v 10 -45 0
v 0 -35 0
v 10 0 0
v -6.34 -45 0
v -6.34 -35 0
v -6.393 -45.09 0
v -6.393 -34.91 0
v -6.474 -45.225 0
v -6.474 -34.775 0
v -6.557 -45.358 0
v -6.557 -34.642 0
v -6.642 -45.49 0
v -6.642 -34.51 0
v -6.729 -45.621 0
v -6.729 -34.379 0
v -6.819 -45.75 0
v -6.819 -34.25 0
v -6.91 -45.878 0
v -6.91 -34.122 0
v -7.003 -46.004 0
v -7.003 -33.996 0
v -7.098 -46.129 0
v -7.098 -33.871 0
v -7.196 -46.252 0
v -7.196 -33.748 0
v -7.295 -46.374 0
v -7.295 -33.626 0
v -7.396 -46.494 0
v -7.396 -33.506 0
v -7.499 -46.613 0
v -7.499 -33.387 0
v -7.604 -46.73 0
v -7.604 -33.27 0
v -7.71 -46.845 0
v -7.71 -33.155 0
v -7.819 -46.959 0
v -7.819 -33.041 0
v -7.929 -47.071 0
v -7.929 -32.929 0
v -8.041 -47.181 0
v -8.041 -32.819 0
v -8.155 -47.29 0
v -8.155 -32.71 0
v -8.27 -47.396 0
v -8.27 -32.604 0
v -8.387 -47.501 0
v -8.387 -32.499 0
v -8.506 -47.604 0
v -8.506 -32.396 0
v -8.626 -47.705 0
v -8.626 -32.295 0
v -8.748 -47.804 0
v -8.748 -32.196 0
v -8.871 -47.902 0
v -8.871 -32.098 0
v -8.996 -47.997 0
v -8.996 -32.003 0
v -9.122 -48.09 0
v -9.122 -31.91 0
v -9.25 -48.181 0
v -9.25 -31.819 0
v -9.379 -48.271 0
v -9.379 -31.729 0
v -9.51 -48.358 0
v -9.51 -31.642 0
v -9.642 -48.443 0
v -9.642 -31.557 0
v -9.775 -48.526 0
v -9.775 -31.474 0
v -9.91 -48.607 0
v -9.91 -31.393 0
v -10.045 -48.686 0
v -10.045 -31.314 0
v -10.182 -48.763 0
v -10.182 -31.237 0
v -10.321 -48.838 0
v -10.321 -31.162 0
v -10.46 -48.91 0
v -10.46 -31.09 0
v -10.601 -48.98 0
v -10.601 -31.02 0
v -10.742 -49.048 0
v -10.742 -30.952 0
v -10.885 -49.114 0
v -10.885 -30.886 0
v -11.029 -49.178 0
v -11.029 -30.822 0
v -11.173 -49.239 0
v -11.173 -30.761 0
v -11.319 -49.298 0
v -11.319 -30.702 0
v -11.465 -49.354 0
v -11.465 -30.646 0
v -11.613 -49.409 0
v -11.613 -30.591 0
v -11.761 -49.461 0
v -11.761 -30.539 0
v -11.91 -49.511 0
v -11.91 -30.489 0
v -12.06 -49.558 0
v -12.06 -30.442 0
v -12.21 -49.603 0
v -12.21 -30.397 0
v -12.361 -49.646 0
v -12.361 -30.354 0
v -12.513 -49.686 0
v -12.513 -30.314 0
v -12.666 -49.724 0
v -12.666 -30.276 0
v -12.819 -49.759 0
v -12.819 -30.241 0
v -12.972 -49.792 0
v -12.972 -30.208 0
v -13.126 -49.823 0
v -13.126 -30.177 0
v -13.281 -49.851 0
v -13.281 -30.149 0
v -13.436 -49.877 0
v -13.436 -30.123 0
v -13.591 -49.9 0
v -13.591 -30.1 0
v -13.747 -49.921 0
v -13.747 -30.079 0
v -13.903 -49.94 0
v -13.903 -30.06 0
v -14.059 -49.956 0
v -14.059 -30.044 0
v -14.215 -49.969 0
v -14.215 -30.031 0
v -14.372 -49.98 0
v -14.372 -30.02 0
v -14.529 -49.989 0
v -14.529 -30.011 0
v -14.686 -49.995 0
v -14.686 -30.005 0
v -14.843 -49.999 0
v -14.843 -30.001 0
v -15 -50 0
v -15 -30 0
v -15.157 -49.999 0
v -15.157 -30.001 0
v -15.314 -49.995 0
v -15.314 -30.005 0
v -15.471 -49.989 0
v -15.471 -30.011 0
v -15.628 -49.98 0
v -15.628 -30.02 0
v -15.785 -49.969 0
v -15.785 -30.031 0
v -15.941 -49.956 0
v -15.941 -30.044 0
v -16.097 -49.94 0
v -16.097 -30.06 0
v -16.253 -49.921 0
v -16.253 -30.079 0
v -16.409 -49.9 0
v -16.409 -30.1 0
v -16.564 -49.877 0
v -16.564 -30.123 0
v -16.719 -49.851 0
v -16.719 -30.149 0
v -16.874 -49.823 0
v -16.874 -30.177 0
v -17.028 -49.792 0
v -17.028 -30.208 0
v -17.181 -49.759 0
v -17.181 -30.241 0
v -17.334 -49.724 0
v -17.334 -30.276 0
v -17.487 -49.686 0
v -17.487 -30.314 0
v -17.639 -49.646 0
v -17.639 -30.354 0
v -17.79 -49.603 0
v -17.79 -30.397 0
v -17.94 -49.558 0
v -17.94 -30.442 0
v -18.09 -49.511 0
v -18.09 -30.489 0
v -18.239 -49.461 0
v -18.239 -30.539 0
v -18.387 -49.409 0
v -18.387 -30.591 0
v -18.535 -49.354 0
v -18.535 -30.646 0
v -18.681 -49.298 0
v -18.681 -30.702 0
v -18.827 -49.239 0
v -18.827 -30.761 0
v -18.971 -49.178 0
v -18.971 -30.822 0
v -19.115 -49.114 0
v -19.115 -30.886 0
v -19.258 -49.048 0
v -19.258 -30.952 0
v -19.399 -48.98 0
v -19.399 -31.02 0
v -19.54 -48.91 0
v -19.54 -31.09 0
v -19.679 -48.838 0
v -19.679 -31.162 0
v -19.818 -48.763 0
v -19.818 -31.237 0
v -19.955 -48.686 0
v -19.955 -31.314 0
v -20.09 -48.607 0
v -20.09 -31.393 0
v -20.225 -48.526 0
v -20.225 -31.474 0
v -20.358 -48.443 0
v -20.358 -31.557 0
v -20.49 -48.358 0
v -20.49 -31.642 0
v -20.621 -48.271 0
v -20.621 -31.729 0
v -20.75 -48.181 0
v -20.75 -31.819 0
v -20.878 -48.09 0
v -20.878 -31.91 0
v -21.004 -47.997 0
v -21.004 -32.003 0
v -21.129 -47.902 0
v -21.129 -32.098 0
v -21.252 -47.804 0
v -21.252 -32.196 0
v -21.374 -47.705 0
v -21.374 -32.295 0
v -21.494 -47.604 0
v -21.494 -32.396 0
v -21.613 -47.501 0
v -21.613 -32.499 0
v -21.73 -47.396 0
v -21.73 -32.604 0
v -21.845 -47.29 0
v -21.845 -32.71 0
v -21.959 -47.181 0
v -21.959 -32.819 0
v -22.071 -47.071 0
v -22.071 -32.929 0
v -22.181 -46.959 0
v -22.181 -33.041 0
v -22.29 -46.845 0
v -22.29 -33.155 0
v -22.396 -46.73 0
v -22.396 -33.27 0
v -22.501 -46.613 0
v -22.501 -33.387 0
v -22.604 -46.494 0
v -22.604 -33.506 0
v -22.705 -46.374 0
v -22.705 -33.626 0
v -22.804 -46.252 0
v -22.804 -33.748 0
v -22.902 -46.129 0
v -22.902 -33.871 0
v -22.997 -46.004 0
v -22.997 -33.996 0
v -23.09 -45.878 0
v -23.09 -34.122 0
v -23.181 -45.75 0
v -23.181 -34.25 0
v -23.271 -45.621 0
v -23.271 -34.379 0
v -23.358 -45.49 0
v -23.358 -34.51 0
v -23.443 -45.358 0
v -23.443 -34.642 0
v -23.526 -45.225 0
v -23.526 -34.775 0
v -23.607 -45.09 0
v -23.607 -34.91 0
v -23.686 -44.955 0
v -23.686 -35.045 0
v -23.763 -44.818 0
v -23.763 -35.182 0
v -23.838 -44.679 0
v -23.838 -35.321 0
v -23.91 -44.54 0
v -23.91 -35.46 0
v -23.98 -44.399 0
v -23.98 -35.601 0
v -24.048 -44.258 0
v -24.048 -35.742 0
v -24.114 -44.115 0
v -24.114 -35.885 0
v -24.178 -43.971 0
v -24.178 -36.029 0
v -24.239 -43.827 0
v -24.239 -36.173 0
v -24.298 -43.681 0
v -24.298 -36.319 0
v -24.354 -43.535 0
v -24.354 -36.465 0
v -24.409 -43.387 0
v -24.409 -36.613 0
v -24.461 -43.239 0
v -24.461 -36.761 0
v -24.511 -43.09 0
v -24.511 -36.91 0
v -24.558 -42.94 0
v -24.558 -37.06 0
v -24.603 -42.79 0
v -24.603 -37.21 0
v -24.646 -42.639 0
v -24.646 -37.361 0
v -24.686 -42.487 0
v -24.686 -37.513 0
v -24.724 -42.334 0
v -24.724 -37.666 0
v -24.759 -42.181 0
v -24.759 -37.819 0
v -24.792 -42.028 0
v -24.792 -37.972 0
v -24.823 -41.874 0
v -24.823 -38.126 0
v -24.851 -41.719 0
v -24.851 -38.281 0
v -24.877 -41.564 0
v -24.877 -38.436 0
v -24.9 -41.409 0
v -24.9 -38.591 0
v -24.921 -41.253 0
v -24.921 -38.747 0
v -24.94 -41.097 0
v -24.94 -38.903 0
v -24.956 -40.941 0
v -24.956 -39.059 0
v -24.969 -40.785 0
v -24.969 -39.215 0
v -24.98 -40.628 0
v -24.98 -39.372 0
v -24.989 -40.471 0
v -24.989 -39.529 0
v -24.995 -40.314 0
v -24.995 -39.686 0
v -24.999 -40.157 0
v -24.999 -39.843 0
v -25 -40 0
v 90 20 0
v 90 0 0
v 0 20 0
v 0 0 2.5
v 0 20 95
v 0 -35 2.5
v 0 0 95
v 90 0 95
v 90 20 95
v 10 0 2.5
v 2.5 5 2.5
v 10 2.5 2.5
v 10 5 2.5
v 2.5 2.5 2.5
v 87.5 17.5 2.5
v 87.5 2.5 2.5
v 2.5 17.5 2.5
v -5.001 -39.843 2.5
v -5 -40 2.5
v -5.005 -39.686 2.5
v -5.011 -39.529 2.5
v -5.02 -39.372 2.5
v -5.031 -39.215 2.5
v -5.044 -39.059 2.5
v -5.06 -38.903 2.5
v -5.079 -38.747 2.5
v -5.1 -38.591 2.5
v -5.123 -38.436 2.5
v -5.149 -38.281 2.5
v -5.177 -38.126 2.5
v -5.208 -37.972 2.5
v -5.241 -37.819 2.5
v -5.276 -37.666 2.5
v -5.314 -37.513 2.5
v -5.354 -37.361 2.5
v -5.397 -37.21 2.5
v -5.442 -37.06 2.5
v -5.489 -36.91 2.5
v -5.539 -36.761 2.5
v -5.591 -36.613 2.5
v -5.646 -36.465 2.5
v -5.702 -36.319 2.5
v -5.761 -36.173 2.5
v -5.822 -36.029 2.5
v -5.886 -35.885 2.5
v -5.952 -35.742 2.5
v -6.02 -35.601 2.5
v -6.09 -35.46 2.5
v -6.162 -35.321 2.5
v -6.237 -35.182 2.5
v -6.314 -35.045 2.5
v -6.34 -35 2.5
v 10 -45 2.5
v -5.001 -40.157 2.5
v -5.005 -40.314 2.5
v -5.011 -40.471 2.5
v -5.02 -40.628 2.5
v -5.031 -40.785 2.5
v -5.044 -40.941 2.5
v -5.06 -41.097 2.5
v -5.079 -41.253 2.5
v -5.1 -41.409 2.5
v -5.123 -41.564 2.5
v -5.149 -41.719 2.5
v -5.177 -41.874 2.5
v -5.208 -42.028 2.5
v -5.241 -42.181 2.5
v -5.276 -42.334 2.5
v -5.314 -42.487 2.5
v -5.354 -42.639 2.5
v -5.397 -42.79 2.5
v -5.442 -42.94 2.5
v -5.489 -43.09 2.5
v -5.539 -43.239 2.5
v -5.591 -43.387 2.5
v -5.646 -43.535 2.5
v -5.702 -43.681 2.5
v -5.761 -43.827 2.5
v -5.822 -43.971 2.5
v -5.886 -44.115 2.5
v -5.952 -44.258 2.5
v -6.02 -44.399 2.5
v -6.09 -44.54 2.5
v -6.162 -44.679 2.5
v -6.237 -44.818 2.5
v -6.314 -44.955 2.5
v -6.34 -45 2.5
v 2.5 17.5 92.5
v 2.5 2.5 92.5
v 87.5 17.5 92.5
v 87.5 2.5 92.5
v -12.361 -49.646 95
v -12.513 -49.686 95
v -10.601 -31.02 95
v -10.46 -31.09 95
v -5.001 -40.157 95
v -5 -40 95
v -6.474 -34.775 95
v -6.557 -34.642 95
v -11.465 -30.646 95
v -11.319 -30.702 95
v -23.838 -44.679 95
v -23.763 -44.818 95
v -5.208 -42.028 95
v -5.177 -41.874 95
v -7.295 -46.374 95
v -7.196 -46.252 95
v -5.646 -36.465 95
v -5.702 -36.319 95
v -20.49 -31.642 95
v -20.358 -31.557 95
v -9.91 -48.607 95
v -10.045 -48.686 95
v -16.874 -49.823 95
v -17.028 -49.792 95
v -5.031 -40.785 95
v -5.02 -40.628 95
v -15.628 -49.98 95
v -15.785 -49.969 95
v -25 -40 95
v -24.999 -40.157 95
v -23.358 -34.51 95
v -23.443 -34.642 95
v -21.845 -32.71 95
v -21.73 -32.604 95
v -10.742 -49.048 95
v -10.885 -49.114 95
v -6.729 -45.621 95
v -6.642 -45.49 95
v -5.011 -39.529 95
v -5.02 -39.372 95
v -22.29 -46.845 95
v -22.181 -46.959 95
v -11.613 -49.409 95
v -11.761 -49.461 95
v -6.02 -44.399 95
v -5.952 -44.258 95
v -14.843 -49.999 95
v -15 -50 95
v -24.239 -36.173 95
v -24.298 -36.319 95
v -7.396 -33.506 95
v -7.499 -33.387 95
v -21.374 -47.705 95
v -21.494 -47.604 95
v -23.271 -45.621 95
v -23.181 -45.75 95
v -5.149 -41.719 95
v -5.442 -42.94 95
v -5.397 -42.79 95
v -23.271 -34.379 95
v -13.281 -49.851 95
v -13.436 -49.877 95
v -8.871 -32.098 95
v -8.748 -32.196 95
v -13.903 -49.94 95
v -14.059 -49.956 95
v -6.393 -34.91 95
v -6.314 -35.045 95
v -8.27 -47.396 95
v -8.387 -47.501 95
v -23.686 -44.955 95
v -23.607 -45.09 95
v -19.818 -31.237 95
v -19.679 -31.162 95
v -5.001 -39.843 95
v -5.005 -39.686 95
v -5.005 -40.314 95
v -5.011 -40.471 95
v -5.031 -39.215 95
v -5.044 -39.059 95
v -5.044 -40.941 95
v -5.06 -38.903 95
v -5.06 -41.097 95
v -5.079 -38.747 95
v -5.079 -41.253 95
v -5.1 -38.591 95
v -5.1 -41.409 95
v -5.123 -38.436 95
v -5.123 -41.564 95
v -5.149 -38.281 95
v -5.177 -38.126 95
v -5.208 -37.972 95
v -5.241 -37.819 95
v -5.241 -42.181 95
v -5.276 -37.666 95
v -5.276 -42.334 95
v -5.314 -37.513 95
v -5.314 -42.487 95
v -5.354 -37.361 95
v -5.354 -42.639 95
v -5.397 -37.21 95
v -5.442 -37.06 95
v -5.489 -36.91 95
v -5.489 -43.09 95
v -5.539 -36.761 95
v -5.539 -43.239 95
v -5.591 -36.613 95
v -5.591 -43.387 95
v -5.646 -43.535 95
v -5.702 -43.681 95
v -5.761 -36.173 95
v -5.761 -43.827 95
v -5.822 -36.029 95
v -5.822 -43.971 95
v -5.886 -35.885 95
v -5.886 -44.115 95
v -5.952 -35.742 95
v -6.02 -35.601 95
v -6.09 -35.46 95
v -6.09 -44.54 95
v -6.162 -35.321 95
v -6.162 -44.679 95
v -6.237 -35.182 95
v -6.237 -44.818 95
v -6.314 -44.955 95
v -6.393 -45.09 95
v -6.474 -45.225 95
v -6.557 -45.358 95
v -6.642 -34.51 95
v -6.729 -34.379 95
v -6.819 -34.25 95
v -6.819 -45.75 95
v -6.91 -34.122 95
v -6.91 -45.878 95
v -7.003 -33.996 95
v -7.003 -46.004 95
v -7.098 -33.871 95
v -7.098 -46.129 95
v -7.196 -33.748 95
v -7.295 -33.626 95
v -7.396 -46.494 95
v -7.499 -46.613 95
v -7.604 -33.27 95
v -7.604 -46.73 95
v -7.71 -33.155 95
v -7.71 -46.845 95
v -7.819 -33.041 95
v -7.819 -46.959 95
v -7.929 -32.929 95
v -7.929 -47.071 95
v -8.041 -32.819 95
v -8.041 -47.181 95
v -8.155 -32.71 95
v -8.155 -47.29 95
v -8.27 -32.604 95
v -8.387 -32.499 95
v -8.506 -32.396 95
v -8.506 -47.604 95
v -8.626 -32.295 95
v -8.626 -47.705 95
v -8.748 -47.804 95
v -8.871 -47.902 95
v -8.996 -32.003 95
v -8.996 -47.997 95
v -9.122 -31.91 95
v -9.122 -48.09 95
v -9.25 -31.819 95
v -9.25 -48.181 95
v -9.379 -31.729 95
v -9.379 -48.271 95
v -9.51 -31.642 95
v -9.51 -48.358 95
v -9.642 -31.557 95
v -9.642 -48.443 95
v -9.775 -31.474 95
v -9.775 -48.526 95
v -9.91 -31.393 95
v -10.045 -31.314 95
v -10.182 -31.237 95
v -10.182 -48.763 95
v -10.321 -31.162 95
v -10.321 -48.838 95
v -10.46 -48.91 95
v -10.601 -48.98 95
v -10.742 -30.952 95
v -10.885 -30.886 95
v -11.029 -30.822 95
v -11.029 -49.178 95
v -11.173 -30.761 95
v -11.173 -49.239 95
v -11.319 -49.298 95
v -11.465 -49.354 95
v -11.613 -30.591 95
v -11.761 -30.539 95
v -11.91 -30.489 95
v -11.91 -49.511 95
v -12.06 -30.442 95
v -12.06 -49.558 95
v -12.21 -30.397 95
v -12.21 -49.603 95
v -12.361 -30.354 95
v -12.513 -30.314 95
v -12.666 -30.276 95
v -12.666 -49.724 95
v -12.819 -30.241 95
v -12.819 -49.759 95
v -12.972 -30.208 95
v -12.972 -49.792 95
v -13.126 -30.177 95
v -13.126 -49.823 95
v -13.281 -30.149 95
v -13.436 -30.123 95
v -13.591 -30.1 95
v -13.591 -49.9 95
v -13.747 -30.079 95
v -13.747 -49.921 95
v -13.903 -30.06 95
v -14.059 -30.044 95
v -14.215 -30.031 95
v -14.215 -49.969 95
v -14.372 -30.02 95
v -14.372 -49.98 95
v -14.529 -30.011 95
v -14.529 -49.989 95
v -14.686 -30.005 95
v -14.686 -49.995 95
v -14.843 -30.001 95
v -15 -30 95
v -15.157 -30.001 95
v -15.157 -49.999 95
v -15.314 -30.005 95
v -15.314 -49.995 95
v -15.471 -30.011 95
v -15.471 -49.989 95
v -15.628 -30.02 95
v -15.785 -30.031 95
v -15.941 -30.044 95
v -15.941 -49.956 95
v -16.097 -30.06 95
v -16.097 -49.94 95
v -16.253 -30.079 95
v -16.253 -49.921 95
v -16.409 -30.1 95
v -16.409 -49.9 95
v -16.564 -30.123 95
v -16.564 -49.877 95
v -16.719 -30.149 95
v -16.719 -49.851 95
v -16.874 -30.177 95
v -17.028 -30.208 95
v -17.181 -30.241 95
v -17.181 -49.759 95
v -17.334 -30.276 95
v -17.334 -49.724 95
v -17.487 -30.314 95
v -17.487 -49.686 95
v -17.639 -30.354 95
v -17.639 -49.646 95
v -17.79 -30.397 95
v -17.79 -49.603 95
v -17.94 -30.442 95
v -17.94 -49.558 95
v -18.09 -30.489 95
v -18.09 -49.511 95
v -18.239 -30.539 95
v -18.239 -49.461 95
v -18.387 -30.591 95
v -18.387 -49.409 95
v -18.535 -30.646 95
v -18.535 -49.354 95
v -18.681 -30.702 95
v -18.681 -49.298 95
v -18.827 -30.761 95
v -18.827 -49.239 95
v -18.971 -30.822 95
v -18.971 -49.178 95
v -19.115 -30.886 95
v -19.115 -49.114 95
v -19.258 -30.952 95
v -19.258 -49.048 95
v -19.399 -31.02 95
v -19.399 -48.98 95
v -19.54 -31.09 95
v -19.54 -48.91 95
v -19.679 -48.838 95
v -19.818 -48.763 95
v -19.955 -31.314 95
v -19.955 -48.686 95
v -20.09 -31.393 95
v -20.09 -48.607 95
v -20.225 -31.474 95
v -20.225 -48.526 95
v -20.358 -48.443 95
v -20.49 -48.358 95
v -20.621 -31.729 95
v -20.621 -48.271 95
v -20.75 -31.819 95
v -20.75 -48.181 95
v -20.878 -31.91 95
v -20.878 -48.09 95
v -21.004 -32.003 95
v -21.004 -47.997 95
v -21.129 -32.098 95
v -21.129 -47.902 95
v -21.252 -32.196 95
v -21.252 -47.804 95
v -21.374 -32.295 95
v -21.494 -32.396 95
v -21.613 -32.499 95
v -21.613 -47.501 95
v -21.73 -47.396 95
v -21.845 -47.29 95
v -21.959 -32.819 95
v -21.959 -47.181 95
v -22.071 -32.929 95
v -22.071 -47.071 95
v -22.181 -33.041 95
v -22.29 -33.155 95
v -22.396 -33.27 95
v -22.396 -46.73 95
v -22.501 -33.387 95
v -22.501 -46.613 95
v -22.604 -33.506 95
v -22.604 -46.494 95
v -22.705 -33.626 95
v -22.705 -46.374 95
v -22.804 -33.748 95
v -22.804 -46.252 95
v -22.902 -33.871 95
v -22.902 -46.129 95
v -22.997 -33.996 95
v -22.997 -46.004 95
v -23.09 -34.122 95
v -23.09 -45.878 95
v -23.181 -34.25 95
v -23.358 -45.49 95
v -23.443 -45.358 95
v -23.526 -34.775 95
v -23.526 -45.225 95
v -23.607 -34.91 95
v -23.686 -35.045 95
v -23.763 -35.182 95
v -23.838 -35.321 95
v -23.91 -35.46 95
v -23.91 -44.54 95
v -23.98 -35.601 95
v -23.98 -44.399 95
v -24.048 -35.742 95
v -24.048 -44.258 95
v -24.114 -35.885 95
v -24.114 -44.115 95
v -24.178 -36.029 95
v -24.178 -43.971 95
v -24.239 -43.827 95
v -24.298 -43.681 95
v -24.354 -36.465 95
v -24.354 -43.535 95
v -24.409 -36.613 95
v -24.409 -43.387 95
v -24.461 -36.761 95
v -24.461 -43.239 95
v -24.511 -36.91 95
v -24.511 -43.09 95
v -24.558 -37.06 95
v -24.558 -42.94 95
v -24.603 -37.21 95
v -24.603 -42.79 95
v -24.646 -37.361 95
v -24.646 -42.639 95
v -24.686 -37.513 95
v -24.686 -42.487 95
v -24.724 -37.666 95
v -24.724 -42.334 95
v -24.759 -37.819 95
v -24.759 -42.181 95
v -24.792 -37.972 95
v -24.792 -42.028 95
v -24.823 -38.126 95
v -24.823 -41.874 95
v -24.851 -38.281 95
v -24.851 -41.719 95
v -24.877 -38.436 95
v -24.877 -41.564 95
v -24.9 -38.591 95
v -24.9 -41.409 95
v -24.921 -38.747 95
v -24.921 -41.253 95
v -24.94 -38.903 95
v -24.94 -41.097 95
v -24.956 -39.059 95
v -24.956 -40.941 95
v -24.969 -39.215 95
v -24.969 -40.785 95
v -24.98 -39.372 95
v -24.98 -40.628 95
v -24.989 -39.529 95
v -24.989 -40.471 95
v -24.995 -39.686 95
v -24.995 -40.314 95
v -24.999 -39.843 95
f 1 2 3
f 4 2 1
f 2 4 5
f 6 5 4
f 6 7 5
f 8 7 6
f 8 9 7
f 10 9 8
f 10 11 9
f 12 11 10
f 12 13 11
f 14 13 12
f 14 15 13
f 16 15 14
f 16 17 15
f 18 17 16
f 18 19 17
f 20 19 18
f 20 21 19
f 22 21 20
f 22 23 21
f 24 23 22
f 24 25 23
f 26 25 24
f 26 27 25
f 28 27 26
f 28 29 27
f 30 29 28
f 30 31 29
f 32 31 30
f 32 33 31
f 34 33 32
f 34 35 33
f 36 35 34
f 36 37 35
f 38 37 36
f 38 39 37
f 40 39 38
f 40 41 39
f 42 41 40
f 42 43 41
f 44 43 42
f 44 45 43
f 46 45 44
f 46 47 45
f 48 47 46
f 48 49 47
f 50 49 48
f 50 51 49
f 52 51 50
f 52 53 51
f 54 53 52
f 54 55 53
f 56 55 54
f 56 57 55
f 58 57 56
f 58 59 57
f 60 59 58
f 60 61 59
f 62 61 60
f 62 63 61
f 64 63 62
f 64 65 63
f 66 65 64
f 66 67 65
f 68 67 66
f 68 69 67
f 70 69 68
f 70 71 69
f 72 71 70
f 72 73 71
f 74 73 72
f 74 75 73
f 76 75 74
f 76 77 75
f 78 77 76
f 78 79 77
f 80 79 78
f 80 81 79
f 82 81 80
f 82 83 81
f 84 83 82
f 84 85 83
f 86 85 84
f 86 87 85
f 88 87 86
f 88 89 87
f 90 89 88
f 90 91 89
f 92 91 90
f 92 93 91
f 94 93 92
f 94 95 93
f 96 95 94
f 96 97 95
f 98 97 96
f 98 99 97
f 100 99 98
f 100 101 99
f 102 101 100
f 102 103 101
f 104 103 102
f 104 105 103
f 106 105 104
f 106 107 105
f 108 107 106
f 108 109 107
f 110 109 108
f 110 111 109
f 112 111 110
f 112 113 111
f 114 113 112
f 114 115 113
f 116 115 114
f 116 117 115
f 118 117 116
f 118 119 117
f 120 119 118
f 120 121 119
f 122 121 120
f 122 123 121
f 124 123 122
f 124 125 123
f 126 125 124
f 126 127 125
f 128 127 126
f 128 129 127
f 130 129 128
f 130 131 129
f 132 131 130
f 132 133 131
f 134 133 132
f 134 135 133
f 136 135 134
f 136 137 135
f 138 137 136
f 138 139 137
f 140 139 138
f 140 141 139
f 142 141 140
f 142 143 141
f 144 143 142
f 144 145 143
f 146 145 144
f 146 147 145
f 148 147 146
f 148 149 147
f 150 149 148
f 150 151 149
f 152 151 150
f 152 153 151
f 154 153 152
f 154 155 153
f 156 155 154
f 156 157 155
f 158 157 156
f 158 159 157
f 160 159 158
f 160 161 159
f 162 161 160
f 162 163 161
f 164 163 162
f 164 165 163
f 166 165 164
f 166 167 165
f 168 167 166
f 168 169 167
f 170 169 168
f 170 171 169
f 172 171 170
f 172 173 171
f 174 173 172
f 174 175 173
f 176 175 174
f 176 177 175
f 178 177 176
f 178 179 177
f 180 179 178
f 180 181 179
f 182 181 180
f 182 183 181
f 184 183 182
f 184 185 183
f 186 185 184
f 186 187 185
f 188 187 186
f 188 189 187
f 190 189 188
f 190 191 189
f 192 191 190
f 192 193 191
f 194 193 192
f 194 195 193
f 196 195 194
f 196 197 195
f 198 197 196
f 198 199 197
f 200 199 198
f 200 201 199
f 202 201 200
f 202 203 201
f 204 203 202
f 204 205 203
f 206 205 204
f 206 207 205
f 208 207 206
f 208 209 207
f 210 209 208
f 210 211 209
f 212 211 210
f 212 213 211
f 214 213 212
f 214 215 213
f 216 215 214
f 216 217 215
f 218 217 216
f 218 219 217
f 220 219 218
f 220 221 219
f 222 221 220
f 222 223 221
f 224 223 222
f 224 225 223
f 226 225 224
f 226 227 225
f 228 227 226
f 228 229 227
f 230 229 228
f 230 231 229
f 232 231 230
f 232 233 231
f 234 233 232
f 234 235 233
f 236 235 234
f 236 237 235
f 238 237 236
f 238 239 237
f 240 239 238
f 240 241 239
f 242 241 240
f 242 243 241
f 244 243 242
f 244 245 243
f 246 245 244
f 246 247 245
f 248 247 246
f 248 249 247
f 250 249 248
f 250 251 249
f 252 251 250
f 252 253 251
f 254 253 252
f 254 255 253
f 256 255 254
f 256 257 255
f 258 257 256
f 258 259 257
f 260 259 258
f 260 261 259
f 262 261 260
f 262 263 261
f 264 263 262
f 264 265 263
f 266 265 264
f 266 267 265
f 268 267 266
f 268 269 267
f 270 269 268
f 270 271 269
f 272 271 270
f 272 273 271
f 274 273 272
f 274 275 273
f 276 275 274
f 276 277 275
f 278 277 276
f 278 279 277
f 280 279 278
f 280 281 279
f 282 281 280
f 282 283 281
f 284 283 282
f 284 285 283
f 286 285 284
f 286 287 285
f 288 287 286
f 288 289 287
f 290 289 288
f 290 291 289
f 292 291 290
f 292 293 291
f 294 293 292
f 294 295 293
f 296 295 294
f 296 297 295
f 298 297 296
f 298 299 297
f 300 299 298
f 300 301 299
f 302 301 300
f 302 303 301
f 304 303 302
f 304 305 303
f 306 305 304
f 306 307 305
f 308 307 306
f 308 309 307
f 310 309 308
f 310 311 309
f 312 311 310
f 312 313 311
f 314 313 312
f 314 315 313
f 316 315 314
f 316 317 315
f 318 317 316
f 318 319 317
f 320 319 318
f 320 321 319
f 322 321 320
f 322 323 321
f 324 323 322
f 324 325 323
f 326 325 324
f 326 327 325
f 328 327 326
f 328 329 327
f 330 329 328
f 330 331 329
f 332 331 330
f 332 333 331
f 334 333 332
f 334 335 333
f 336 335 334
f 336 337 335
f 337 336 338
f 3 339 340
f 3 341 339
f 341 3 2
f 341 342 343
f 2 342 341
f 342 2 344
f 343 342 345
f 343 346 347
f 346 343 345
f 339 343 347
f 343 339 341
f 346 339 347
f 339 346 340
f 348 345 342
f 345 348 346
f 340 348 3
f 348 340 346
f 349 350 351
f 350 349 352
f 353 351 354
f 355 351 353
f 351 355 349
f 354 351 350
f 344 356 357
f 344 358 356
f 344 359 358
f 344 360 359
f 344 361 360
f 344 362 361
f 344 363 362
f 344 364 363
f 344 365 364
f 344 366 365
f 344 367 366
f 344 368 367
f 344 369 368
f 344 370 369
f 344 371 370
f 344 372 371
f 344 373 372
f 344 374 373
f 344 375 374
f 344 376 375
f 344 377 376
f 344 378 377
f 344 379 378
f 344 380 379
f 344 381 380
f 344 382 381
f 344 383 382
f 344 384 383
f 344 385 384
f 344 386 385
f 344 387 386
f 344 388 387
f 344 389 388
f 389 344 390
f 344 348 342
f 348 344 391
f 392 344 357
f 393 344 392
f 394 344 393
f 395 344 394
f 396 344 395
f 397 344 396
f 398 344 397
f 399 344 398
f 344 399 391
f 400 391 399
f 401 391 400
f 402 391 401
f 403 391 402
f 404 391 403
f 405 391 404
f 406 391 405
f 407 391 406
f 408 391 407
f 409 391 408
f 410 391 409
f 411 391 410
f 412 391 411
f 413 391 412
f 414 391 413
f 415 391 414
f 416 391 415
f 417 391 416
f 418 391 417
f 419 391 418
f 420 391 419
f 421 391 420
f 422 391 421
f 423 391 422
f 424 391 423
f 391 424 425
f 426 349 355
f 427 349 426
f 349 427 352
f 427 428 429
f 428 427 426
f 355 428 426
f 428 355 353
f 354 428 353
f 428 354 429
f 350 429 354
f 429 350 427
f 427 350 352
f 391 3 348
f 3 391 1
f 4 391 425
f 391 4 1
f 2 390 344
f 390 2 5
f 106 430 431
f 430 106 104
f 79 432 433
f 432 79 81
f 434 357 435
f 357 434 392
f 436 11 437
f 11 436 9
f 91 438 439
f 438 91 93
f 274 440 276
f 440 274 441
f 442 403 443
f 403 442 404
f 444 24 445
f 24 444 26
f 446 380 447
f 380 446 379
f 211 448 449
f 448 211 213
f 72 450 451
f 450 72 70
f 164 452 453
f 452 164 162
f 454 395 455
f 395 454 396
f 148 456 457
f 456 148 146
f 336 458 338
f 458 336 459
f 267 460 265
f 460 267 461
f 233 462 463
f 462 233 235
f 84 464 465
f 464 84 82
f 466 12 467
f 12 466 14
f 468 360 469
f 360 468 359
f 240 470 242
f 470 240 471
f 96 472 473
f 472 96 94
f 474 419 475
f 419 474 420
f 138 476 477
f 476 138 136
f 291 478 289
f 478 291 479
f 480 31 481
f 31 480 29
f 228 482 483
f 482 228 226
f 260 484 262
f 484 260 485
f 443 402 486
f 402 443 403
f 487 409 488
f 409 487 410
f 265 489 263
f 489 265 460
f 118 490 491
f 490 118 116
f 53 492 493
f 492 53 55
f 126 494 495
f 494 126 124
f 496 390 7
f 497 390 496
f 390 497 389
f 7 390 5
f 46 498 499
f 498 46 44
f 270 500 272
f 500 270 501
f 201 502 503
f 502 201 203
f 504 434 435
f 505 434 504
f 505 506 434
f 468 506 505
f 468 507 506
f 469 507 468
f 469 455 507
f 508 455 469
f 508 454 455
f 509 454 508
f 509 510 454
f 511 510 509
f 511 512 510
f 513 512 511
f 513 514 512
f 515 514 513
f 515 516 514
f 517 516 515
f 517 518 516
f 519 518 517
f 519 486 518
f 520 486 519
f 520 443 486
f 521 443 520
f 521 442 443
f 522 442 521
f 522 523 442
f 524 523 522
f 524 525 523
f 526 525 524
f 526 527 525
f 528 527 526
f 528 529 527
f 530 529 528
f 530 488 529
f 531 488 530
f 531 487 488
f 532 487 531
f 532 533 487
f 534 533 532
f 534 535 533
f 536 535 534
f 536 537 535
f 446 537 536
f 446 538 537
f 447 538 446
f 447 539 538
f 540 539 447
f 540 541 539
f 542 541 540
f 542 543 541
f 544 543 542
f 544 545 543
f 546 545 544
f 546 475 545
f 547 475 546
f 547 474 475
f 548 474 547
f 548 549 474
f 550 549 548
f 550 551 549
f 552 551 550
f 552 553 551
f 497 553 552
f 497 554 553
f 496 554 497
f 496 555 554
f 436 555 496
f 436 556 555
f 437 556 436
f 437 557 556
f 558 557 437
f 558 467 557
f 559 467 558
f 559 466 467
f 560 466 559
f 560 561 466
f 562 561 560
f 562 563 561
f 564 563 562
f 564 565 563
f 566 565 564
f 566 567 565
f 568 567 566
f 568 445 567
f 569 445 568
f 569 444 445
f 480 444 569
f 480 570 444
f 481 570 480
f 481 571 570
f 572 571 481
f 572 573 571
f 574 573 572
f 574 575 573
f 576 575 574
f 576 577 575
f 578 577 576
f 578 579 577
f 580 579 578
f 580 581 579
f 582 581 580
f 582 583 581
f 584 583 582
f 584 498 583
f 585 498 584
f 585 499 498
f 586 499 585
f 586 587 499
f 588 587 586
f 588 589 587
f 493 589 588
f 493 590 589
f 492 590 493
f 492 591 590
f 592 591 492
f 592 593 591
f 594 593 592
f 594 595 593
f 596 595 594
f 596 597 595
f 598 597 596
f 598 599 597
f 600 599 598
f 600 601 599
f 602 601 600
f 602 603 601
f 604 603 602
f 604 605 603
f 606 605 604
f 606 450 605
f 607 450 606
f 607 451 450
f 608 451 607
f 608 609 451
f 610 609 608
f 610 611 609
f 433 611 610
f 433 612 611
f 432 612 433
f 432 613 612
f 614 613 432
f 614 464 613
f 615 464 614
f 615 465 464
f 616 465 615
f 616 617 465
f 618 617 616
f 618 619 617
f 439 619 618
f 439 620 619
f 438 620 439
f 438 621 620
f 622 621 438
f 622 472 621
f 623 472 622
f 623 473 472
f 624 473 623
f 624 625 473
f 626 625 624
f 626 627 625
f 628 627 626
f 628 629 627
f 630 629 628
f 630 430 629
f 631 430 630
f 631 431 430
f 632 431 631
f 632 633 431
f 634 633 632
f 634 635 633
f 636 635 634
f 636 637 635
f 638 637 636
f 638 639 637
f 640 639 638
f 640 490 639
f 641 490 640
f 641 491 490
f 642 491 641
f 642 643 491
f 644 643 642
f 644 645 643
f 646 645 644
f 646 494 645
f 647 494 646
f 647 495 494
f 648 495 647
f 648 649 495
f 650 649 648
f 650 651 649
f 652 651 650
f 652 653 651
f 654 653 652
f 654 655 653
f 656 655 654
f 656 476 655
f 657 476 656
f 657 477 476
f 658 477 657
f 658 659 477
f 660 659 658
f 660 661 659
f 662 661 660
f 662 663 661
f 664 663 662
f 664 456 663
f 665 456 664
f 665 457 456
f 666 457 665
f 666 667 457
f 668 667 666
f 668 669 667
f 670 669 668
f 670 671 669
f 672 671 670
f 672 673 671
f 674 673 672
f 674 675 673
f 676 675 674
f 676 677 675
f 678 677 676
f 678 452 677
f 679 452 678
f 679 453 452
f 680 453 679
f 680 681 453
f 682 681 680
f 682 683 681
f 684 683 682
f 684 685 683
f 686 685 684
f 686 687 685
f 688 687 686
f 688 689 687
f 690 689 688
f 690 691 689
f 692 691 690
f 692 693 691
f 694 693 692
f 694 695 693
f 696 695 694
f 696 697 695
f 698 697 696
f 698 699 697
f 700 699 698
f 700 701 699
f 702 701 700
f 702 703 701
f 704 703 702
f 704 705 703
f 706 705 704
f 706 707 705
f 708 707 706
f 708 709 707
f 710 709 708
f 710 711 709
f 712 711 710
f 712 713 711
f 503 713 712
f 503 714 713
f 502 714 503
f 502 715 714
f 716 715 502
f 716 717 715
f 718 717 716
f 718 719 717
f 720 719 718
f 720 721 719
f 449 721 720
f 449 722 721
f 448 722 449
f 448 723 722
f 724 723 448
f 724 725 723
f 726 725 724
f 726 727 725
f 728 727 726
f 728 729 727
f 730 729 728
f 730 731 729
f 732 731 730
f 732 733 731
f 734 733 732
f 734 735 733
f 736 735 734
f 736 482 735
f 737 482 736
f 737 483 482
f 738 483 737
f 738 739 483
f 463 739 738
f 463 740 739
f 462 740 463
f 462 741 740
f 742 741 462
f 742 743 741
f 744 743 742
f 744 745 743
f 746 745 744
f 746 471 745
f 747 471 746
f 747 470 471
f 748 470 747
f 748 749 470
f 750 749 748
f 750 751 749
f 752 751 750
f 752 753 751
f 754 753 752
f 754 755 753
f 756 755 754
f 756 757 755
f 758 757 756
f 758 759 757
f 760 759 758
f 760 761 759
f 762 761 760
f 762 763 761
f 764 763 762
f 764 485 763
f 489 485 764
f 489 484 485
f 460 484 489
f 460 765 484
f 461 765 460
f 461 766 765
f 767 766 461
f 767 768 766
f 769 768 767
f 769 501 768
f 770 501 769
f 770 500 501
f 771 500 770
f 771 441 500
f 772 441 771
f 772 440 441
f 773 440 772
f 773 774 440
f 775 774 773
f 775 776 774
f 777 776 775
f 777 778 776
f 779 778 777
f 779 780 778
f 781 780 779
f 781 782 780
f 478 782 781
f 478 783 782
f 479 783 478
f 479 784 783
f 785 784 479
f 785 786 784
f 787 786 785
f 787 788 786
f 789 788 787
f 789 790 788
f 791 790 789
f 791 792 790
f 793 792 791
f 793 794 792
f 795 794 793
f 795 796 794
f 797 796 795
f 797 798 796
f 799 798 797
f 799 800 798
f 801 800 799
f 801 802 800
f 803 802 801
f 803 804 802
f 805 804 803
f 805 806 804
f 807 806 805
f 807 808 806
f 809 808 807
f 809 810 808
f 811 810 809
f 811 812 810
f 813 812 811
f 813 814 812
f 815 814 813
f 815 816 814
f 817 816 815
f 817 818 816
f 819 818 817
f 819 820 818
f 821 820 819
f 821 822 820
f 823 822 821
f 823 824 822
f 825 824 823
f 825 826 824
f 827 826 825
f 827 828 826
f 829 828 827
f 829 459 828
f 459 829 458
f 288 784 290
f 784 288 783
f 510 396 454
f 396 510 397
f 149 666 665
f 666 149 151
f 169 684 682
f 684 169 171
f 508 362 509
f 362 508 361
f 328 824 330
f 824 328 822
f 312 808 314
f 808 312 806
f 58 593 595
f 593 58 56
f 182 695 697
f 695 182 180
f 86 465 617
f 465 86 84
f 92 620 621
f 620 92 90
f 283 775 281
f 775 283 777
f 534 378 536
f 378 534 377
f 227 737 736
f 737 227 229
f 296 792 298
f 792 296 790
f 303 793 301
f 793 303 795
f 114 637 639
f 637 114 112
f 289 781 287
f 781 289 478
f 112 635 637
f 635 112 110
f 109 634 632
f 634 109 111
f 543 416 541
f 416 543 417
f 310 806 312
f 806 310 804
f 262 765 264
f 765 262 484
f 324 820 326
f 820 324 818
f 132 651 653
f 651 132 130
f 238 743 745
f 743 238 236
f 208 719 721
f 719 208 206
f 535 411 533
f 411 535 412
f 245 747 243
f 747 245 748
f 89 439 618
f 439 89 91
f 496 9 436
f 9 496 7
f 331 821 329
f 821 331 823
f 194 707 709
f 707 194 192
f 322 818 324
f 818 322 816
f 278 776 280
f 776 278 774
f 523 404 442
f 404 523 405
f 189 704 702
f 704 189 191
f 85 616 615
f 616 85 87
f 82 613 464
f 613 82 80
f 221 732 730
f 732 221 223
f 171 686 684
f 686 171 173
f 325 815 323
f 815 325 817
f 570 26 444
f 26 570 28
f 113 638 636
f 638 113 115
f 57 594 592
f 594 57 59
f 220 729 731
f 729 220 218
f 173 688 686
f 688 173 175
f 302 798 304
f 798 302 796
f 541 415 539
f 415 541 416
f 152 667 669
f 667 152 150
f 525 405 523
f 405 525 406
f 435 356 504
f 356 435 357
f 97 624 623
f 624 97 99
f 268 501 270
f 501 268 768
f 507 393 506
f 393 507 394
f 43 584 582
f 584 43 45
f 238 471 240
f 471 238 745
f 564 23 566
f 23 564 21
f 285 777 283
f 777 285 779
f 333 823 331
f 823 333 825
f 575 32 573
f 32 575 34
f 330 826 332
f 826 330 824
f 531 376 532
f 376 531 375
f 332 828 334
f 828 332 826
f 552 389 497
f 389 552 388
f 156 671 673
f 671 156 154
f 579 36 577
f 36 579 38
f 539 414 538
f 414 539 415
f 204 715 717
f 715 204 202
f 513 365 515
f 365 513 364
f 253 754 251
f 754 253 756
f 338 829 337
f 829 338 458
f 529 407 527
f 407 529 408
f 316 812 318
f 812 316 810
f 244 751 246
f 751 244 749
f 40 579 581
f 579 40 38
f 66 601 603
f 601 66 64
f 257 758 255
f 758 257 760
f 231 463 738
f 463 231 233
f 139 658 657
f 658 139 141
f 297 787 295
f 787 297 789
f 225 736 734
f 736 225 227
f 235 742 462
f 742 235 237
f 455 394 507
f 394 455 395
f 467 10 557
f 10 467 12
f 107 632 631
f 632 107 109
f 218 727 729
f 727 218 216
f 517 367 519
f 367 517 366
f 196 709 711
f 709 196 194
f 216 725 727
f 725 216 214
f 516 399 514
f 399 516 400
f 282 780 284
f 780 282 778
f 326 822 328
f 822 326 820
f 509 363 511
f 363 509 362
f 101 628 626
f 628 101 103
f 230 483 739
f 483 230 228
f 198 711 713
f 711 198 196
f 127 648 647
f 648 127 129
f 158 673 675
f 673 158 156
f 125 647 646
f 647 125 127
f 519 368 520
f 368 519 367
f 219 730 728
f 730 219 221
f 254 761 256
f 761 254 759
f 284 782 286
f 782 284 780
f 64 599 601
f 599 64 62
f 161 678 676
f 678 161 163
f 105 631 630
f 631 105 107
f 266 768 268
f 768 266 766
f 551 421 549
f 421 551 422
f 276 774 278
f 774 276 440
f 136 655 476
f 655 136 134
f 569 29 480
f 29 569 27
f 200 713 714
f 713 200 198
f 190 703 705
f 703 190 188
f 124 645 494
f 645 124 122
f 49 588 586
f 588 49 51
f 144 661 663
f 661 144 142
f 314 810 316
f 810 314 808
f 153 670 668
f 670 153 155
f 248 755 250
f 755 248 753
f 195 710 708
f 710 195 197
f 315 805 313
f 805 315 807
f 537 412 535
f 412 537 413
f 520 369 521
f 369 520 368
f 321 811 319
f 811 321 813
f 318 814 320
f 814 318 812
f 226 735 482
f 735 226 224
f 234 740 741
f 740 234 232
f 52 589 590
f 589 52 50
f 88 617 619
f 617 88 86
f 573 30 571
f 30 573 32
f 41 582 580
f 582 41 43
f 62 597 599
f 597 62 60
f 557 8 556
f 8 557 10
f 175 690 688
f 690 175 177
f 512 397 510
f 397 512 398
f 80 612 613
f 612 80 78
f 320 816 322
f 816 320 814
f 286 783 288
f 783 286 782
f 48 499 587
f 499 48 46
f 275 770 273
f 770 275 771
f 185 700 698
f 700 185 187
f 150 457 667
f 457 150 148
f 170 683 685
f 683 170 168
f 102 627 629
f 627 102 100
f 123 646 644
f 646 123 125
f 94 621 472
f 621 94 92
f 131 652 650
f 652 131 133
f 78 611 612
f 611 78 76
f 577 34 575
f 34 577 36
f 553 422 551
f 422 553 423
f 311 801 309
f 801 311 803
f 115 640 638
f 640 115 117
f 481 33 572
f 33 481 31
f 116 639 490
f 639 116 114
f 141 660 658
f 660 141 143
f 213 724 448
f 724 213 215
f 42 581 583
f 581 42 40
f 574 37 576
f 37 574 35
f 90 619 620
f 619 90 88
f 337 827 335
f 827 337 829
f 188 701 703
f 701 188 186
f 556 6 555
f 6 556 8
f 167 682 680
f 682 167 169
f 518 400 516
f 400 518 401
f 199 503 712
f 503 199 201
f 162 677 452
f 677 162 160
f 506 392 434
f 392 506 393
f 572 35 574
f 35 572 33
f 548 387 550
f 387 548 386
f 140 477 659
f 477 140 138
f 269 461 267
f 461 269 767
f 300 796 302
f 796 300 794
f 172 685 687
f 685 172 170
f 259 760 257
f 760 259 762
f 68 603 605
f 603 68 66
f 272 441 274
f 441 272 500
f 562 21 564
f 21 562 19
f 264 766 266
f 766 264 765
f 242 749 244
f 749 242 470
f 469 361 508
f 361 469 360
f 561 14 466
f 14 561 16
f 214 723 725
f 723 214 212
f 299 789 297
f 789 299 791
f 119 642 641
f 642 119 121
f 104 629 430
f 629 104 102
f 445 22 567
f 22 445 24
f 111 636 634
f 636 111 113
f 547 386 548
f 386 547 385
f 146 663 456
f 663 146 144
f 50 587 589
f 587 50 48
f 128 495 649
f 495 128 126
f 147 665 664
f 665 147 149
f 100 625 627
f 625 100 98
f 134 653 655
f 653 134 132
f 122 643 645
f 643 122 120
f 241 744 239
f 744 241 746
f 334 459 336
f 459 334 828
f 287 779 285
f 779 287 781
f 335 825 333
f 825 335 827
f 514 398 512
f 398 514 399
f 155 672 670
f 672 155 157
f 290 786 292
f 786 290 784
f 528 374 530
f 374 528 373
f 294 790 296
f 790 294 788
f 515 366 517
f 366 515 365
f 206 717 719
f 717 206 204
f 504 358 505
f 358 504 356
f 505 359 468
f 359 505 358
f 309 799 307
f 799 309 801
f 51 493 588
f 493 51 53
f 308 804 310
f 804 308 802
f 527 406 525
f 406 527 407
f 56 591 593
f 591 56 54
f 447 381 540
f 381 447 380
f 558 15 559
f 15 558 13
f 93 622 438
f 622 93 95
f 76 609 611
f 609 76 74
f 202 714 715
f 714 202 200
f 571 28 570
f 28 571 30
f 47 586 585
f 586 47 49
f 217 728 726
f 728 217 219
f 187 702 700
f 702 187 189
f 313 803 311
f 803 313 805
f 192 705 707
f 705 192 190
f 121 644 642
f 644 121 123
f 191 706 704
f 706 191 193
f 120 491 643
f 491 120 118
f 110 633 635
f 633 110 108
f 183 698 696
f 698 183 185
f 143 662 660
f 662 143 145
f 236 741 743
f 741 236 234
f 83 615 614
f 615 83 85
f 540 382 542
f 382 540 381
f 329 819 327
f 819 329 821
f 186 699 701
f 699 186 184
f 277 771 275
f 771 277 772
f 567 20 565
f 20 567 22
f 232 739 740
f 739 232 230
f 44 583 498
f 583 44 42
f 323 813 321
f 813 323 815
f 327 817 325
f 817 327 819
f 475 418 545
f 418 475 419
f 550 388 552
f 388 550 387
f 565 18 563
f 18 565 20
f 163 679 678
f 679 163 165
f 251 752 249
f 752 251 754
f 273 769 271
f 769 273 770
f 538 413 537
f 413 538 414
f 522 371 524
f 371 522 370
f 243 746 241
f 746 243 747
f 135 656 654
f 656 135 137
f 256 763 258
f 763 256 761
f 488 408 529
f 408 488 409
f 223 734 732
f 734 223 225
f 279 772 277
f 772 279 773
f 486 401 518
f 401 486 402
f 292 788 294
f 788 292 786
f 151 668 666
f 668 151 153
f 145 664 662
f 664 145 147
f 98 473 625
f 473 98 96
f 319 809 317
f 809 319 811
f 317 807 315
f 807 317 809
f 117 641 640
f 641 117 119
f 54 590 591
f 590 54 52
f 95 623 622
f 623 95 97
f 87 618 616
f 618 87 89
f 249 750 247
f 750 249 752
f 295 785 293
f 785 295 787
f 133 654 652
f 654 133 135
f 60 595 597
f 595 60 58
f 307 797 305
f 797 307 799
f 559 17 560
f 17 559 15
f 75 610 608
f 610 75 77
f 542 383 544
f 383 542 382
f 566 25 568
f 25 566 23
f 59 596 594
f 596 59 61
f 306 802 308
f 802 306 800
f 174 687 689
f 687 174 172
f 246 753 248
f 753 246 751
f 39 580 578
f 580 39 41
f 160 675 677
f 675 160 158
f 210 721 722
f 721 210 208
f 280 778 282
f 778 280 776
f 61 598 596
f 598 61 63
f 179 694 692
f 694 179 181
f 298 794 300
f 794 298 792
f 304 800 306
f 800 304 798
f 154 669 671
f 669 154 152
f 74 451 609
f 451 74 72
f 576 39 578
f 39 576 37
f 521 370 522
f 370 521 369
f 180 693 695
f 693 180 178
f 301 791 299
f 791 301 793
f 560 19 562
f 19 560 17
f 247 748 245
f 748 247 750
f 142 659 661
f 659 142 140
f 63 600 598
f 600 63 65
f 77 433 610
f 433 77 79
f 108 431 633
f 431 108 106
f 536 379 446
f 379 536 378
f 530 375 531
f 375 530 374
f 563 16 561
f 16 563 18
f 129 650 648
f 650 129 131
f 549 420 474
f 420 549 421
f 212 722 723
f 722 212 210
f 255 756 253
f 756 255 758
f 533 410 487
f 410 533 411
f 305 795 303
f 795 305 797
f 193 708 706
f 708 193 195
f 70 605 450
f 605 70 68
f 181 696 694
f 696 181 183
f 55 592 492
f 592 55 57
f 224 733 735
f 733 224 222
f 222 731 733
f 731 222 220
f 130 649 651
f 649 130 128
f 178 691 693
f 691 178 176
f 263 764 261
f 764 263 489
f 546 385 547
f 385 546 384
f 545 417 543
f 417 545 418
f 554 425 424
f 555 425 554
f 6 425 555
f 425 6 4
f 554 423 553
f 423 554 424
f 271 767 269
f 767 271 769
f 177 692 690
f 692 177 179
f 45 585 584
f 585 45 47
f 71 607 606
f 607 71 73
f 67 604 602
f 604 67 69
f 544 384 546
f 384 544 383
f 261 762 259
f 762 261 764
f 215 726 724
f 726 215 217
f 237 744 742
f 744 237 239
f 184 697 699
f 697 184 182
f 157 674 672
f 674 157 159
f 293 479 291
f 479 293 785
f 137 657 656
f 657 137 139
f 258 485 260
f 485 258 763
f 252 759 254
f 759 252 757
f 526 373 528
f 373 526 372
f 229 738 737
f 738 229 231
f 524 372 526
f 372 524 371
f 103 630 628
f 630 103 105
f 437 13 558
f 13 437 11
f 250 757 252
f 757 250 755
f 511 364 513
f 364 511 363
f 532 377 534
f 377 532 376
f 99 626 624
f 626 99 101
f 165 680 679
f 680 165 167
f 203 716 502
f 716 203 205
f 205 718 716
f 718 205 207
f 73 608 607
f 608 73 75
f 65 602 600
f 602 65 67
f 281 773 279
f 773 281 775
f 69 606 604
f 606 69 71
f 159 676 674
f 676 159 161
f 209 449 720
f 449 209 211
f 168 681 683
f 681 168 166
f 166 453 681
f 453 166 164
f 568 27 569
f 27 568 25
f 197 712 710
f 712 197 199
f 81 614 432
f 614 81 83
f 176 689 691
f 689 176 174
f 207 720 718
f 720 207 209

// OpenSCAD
$fn=400;

// Block
difference()
{
	linear_extrude(height=95)
	square([90,20]);

	translate([2.5,2.5,2.5])
	linear_extrude(height=90)
	square([85,15]);
}

// Verbinder
translate([0,-45,0])
linear_extrude(height=2.5)
square([10,50]);

translate([0,-45,0])
rotate([0,0,90])
linear_extrude(height=2.5)
square([10,15]);

// Säule
translate([-15,-40,0])
linear_extrude(height=95)
circle(10.0);
